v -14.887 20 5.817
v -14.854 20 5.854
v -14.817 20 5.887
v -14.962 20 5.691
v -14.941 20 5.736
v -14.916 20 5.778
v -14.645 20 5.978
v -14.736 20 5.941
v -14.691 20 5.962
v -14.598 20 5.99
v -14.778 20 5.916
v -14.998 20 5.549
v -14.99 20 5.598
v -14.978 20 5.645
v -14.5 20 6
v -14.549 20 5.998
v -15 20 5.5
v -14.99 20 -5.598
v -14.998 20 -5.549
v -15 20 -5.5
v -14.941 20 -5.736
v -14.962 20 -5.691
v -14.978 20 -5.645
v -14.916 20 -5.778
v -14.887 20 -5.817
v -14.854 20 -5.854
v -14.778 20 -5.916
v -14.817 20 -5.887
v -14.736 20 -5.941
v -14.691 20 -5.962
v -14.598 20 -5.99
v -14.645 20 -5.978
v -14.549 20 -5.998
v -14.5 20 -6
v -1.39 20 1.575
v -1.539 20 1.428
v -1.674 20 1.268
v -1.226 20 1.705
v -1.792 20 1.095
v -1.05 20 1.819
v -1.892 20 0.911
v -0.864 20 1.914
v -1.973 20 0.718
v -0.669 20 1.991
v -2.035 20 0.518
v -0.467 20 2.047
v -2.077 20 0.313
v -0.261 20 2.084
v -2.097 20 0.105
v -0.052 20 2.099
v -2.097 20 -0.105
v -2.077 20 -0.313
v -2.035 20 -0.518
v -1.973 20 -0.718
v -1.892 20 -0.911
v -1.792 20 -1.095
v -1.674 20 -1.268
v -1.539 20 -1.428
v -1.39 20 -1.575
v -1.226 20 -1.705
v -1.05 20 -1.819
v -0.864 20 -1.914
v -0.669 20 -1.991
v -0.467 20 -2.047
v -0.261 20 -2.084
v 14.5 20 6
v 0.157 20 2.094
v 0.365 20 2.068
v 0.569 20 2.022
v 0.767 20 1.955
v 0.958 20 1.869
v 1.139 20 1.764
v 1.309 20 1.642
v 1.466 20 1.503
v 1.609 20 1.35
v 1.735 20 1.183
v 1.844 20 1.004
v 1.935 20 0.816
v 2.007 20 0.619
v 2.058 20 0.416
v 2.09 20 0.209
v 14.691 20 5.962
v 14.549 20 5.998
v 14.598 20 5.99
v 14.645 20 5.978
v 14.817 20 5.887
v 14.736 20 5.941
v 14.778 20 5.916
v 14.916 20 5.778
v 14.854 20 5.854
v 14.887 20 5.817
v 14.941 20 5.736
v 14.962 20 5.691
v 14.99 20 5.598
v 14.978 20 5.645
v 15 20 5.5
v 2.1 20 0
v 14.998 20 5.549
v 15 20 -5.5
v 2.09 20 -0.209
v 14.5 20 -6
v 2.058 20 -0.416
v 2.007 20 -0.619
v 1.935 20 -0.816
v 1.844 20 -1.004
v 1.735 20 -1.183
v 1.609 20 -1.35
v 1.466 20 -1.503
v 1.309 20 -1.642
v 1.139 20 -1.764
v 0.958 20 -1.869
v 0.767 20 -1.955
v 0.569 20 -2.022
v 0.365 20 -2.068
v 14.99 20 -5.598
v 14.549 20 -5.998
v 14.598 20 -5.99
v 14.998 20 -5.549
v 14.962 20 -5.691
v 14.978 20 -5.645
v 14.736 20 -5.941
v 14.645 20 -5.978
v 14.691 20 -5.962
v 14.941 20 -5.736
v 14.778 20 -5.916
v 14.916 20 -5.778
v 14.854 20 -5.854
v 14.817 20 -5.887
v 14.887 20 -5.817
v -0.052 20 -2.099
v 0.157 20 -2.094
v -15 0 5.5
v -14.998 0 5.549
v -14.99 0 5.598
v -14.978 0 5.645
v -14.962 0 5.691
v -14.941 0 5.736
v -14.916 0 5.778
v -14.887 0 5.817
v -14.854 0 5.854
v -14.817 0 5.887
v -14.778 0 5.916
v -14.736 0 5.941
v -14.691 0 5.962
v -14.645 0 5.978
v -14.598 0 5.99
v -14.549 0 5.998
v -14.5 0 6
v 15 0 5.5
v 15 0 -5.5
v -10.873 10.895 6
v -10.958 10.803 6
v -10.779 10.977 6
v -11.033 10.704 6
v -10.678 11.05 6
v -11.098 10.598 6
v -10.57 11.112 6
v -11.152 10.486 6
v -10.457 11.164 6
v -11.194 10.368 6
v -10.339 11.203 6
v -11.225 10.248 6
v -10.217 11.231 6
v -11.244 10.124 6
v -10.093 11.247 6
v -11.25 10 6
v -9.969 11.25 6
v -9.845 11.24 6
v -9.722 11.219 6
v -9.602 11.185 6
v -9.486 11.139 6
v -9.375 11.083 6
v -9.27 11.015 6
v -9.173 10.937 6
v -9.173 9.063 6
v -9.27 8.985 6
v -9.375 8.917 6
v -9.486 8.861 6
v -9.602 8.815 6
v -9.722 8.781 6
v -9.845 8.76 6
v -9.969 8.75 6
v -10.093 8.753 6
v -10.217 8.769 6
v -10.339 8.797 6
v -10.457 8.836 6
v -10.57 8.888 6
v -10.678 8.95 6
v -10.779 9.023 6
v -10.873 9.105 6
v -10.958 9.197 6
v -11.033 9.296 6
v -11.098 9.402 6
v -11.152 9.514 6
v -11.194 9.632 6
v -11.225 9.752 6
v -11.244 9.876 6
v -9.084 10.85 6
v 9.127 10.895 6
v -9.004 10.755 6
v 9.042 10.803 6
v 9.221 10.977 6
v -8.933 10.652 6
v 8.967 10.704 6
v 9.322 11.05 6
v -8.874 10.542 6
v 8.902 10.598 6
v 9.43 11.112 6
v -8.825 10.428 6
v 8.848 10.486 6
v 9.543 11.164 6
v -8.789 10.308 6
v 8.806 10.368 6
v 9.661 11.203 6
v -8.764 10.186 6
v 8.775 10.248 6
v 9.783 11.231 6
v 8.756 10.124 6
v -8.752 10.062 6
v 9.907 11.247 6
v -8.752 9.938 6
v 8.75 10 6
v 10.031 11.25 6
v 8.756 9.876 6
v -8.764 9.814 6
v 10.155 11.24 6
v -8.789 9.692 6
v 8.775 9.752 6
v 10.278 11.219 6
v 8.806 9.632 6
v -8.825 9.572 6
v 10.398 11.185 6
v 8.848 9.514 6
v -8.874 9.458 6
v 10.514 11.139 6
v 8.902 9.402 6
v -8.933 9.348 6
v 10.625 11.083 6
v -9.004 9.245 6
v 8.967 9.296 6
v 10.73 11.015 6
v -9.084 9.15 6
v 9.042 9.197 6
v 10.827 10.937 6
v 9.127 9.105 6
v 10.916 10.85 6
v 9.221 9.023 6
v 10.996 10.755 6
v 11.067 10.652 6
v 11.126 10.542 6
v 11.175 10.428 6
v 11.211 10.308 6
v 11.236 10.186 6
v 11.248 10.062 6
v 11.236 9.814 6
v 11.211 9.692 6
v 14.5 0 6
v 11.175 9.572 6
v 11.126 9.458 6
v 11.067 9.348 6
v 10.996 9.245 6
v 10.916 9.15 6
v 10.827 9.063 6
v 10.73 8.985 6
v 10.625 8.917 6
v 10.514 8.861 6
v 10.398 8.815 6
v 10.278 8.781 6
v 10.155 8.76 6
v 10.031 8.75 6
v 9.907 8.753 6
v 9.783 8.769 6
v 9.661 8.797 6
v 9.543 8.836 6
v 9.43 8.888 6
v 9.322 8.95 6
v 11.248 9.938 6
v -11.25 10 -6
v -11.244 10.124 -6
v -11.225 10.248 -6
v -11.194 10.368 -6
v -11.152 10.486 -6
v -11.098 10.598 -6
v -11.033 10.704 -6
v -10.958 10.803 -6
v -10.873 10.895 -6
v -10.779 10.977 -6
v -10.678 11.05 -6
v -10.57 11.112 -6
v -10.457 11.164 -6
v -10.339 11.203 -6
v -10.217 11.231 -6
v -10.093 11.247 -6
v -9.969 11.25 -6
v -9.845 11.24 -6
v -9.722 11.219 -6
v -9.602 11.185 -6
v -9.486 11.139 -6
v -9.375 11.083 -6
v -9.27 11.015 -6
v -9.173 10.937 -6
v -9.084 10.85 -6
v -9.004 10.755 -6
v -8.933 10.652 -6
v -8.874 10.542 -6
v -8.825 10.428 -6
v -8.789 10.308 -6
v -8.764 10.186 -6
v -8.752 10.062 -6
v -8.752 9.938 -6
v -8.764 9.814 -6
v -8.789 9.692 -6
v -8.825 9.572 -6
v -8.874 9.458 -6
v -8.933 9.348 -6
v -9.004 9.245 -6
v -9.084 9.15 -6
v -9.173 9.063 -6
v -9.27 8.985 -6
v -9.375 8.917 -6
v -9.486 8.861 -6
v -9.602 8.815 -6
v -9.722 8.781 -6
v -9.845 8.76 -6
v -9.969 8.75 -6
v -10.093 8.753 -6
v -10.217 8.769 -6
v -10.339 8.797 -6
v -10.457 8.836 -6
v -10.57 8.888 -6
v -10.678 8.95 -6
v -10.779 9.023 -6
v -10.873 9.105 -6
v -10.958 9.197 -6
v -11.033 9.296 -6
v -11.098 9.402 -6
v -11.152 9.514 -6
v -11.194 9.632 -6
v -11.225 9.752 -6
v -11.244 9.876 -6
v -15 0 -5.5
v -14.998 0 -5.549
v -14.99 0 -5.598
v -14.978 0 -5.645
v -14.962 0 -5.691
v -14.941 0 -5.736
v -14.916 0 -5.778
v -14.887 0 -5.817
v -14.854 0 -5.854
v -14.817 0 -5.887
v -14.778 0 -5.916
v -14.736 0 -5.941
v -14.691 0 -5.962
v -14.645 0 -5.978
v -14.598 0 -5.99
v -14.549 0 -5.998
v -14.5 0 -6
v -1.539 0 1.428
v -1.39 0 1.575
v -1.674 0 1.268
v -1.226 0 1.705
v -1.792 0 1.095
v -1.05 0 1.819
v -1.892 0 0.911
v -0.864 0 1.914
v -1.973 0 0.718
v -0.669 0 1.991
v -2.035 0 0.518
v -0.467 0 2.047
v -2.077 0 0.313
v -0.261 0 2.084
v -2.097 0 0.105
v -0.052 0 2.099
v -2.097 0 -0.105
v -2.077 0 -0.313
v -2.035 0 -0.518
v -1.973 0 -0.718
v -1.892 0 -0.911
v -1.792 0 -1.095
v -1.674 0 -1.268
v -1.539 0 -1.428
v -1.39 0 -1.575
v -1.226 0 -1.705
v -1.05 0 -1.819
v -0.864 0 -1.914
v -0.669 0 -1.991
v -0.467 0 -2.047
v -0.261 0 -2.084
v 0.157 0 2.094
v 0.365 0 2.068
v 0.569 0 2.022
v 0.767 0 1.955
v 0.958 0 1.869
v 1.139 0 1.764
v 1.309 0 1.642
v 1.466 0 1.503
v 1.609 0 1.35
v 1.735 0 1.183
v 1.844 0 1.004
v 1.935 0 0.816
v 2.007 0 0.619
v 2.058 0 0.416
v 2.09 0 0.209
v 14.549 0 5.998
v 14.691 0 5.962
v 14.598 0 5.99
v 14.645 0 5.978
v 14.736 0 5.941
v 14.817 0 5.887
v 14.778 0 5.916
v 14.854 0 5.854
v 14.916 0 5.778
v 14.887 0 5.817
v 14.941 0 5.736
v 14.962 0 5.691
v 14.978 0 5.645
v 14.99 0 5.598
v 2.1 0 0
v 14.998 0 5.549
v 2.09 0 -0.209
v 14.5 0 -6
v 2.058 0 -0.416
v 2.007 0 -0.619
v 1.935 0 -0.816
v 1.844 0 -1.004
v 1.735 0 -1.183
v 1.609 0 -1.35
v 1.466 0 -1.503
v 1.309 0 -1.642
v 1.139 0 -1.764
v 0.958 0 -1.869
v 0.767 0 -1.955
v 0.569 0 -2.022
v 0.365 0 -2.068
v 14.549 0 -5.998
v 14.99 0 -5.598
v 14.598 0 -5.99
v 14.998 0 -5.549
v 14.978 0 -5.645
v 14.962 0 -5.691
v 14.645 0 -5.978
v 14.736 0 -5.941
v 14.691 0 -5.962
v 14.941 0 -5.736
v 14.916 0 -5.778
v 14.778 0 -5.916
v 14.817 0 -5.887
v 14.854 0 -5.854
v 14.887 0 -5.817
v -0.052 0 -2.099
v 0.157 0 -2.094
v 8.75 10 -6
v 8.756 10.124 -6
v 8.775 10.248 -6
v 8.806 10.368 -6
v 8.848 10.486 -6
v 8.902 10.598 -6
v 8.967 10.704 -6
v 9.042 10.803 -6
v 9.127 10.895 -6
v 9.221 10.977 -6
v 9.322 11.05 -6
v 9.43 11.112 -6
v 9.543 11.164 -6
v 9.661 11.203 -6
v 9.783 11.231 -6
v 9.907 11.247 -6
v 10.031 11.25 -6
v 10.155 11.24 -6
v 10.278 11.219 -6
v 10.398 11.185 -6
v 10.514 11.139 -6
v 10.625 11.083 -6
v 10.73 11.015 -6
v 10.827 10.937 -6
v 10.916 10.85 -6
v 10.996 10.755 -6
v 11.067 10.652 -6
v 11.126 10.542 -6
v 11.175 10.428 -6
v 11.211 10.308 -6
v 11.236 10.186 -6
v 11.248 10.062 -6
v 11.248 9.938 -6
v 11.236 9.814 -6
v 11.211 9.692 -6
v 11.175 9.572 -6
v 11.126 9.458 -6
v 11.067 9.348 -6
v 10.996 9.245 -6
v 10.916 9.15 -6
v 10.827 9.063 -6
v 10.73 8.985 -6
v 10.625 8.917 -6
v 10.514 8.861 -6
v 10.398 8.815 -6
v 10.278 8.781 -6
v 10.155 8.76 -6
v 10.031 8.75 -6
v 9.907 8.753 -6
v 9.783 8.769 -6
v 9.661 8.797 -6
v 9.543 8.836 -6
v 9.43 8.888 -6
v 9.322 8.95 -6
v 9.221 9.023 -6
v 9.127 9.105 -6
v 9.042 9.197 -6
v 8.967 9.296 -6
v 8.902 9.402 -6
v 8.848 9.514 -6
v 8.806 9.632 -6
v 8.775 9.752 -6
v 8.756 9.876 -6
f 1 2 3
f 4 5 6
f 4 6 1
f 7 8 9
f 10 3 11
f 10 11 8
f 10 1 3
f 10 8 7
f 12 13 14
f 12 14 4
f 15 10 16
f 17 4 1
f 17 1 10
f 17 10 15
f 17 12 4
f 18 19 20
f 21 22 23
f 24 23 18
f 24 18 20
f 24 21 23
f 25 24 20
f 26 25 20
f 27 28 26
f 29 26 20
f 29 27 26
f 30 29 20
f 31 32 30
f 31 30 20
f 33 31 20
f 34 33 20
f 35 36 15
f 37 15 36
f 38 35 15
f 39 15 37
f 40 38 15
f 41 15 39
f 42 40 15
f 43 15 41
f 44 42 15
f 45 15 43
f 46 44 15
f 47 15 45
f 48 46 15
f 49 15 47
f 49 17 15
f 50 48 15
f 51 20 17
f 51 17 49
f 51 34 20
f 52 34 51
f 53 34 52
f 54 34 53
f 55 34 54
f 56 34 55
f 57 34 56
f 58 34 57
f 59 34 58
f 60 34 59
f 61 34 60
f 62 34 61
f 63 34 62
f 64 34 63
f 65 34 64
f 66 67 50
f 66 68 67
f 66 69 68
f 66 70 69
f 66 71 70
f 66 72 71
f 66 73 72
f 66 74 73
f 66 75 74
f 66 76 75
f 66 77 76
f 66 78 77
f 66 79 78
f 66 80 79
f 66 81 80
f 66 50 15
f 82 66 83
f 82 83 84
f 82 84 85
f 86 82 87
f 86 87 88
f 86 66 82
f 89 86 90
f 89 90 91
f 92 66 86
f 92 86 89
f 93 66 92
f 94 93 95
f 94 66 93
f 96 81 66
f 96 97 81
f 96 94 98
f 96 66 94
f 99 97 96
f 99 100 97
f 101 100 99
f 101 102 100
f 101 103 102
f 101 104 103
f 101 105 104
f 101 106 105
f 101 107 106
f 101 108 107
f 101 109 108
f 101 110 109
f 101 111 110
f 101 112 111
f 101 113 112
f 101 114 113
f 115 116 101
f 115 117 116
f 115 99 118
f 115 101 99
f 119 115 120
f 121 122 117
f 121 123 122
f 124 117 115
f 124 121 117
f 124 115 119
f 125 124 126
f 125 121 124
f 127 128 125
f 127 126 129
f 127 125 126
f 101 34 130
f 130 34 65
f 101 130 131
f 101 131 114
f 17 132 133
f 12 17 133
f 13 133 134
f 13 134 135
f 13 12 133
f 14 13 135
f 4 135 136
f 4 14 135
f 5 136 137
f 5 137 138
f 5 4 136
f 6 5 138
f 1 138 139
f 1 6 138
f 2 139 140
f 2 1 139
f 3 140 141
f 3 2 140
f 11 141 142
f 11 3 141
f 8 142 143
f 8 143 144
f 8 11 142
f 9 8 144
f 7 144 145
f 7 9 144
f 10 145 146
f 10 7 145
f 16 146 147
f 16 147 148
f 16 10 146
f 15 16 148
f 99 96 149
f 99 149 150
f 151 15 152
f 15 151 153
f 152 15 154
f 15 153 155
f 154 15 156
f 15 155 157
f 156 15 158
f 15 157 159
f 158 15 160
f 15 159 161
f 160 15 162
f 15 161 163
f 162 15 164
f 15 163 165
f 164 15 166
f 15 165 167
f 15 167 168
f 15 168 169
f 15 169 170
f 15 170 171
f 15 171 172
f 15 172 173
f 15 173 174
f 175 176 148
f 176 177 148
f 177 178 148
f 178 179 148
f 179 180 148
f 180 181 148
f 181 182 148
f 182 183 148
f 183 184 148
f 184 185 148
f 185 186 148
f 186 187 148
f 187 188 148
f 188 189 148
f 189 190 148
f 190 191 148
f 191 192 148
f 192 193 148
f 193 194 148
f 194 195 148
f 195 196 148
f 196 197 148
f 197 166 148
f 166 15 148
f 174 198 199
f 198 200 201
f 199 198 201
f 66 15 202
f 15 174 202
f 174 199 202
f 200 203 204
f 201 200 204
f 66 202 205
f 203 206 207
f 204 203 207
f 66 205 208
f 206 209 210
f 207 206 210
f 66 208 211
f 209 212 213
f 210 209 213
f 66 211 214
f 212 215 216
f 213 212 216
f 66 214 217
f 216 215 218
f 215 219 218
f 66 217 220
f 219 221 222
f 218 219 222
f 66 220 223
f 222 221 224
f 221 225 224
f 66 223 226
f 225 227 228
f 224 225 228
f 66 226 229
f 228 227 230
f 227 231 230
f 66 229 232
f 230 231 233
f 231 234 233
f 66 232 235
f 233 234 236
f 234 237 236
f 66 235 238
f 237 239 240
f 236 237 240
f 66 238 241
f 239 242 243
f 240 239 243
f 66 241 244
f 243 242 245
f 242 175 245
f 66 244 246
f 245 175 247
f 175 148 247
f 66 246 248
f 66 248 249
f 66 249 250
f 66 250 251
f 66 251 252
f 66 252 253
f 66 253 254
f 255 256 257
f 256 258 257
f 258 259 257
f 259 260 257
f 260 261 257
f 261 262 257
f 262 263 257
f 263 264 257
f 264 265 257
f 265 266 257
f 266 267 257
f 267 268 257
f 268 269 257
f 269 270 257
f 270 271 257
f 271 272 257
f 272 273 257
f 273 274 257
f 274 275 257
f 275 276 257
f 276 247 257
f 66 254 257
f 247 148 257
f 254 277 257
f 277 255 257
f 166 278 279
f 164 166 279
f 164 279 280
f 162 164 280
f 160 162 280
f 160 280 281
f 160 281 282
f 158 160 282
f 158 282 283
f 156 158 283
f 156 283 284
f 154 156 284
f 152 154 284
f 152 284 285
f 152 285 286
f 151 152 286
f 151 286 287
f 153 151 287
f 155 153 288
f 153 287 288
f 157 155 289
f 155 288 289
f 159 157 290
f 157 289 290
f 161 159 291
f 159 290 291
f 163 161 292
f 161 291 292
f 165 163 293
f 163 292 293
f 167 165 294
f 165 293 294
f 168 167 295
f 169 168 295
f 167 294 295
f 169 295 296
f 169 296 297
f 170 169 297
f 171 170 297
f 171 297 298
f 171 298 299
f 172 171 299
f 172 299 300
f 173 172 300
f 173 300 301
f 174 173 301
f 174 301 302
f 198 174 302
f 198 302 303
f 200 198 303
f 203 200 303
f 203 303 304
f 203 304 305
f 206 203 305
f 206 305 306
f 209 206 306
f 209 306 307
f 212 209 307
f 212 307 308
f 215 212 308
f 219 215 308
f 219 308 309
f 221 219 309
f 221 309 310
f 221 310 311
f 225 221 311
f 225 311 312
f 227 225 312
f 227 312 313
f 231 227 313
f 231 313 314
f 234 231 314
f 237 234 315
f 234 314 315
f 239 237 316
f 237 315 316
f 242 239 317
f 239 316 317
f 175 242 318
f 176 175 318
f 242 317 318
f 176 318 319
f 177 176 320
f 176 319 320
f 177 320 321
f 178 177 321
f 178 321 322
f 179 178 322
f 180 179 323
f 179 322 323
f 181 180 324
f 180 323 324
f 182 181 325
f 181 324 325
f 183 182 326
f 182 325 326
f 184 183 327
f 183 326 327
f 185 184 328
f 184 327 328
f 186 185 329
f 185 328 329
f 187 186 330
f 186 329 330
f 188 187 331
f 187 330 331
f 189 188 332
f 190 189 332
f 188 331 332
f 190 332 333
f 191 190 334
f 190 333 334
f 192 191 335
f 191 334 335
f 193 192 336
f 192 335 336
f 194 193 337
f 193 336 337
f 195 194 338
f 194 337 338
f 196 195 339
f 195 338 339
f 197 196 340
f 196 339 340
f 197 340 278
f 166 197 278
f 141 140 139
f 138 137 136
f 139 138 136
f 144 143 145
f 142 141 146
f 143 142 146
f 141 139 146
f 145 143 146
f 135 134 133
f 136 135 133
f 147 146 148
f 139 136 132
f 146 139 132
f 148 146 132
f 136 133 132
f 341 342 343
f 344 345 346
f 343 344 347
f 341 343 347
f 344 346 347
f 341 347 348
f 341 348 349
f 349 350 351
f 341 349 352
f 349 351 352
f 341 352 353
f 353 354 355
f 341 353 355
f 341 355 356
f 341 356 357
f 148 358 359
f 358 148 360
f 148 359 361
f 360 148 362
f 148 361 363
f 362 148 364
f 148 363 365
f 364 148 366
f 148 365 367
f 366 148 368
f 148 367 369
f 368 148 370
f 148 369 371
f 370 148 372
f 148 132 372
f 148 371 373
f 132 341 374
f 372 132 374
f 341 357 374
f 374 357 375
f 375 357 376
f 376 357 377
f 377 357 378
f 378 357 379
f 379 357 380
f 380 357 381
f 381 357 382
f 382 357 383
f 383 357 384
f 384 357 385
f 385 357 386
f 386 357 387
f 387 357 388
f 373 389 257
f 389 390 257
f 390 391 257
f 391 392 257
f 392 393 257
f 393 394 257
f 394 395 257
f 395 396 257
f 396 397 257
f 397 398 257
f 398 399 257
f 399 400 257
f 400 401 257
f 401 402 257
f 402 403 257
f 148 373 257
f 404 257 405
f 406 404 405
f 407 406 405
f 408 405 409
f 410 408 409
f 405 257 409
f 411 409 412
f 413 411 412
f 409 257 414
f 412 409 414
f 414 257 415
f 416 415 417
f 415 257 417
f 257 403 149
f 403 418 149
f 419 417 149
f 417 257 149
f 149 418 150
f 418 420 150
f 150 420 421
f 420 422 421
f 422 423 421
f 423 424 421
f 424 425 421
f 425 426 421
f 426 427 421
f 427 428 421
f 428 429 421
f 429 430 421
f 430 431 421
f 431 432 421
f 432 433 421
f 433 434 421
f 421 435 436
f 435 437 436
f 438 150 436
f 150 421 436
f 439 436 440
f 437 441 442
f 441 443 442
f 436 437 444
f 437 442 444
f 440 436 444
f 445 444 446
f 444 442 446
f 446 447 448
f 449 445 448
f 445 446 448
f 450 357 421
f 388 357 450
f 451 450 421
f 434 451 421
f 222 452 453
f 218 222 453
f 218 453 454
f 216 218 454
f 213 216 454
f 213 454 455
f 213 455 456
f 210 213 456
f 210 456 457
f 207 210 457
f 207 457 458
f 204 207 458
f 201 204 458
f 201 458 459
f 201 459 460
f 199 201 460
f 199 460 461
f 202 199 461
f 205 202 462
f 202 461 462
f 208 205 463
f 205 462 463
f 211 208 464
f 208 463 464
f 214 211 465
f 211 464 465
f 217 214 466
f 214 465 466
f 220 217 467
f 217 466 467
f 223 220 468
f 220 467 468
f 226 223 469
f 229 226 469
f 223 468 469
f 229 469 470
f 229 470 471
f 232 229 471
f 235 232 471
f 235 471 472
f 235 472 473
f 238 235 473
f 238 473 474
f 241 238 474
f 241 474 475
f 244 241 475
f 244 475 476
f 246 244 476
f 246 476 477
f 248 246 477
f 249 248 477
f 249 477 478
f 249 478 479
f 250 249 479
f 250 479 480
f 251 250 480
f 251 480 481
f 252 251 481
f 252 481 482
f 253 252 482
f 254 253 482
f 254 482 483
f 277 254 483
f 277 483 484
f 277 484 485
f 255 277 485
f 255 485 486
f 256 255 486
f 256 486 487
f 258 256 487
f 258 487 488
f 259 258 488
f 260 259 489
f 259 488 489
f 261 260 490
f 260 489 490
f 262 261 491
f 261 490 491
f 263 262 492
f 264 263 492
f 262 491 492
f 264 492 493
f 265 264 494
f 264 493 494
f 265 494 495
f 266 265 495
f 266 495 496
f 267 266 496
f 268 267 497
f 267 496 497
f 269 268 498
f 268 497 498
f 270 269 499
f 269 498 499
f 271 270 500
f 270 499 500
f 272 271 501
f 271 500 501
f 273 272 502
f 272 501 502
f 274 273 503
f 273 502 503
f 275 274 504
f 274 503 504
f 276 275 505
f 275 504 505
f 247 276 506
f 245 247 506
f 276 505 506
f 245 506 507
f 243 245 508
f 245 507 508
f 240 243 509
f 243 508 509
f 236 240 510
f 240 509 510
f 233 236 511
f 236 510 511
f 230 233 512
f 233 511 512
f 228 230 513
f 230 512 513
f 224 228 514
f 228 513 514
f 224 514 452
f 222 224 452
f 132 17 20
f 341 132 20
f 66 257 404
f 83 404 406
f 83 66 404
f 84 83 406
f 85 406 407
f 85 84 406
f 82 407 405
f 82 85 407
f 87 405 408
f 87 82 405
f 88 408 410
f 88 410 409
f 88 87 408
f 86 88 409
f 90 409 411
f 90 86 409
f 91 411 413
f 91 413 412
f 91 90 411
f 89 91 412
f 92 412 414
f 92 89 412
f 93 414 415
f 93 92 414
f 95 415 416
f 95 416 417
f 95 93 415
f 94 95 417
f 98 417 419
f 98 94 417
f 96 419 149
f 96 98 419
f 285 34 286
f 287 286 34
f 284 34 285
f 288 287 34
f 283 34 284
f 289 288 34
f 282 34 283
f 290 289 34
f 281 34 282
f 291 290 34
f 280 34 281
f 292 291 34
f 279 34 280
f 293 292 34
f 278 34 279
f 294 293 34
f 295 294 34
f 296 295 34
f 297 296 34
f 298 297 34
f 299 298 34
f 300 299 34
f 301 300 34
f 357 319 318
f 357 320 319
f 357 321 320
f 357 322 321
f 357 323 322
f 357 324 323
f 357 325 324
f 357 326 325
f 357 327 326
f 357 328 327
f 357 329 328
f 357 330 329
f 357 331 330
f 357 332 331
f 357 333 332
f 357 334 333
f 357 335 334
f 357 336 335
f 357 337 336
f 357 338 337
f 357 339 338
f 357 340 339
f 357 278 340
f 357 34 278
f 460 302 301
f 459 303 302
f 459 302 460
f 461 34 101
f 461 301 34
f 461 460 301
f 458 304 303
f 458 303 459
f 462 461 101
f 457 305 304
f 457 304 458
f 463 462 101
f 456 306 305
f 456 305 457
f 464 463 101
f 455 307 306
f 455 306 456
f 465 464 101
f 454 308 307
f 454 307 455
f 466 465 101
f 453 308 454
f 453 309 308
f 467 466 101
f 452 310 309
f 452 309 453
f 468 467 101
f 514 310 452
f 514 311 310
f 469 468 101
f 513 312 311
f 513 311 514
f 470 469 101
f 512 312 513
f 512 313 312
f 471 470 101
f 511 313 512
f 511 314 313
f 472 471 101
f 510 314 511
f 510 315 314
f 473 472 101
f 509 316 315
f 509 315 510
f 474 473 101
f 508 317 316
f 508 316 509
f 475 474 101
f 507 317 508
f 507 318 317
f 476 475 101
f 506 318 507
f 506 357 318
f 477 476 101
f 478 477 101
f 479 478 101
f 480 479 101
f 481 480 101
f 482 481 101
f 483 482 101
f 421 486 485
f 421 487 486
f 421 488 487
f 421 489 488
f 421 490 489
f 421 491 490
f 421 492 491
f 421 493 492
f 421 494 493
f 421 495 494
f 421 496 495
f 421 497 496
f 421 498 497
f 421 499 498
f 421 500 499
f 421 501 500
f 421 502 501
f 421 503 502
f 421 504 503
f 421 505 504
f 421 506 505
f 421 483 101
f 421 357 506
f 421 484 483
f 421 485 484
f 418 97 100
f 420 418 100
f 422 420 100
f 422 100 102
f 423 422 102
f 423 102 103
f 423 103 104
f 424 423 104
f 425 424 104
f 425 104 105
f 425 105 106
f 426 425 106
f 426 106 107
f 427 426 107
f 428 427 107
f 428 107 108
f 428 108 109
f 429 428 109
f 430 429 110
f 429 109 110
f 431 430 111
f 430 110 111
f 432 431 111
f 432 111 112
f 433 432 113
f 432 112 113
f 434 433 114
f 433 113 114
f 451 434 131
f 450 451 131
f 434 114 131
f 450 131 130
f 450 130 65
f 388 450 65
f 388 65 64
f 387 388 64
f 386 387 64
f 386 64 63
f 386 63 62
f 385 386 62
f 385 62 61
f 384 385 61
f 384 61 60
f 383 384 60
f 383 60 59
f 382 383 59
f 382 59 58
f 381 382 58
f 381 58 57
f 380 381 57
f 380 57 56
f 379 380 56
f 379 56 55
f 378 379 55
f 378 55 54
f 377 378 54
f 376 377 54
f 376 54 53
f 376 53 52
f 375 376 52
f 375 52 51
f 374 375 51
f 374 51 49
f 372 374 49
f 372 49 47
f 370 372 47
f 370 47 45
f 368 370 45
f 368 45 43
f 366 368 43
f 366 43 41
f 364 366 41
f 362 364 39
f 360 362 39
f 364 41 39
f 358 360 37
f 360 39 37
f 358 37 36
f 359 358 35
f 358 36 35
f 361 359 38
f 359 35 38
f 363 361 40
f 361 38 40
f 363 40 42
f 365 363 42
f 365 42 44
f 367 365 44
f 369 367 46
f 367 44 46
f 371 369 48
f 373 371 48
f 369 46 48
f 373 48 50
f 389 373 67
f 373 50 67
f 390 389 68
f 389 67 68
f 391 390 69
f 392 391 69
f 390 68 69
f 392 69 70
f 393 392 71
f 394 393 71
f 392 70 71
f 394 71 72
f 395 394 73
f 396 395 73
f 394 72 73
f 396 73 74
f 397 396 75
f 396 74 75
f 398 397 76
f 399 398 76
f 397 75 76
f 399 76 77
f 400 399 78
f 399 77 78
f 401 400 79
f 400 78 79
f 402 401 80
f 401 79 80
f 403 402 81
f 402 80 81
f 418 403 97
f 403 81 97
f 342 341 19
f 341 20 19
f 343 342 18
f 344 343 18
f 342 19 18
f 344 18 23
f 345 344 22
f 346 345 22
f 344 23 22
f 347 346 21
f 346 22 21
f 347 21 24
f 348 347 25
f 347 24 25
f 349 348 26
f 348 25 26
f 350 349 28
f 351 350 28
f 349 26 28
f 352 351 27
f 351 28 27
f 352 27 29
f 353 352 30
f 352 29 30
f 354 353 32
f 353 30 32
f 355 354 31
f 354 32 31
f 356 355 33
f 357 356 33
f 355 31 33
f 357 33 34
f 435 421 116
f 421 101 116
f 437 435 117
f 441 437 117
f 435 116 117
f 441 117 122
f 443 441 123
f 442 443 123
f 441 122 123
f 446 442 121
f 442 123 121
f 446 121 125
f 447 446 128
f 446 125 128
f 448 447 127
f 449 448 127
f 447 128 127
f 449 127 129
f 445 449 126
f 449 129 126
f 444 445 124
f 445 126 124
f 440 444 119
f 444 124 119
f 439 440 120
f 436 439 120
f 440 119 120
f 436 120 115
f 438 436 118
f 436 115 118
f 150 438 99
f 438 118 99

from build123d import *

# Parameters (mm, degrees)
SKETCH1_W                   = 30
SKETCH1_H                   = 12
BOSS_EXTRUDE1_DEPTH         = 20
TAP_DRILL_FOR_M5X0_8_TAP1_D = 4.2
TAP_DRILL_FOR_M3X0_5_TAP1_D = 2.5
FILLET1_R                   = 0.5


with BuildPart() as part:
    # Sketch1 → Boss-Extrude1 (new body)
    with BuildSketch(Plane(origin=(0, 0, 0), x_dir=(1, 0, 0), z_dir=(0, 1, 0))):
        Rectangle(SKETCH1_W, SKETCH1_H)
    extrude(amount=BOSS_EXTRUDE1_DEPTH)

    # Tap Drill for M5x0.8 Tap1 (through all)
    with Locations(Plane(origin=(0, 0, 0), x_dir=(-1, 0, 0), z_dir=(0, -1, 0))):
        with Locations((0, 0)):
            Hole(TAP_DRILL_FOR_M5X0_8_TAP1_D / 2)

    # Tap Drill for M3x0.5 Tap1 (through all)
    with Locations(Plane.XY.offset(6)):
        with Locations((-10, 10), (10, 10)):
            Hole(TAP_DRILL_FOR_M3X0_5_TAP1_D / 2)

    # Fillet1
    fillet1_edges = [part.edges().sort_by_distance(p)[0] for p in [
        (-15, 10, -6),
        (15, 10, -6),
        (15, 10, 6),
        (-15, 10, 6),
    ]]
    fillet(fillet1_edges, radius=FILLET1_R)


solid = part.part
